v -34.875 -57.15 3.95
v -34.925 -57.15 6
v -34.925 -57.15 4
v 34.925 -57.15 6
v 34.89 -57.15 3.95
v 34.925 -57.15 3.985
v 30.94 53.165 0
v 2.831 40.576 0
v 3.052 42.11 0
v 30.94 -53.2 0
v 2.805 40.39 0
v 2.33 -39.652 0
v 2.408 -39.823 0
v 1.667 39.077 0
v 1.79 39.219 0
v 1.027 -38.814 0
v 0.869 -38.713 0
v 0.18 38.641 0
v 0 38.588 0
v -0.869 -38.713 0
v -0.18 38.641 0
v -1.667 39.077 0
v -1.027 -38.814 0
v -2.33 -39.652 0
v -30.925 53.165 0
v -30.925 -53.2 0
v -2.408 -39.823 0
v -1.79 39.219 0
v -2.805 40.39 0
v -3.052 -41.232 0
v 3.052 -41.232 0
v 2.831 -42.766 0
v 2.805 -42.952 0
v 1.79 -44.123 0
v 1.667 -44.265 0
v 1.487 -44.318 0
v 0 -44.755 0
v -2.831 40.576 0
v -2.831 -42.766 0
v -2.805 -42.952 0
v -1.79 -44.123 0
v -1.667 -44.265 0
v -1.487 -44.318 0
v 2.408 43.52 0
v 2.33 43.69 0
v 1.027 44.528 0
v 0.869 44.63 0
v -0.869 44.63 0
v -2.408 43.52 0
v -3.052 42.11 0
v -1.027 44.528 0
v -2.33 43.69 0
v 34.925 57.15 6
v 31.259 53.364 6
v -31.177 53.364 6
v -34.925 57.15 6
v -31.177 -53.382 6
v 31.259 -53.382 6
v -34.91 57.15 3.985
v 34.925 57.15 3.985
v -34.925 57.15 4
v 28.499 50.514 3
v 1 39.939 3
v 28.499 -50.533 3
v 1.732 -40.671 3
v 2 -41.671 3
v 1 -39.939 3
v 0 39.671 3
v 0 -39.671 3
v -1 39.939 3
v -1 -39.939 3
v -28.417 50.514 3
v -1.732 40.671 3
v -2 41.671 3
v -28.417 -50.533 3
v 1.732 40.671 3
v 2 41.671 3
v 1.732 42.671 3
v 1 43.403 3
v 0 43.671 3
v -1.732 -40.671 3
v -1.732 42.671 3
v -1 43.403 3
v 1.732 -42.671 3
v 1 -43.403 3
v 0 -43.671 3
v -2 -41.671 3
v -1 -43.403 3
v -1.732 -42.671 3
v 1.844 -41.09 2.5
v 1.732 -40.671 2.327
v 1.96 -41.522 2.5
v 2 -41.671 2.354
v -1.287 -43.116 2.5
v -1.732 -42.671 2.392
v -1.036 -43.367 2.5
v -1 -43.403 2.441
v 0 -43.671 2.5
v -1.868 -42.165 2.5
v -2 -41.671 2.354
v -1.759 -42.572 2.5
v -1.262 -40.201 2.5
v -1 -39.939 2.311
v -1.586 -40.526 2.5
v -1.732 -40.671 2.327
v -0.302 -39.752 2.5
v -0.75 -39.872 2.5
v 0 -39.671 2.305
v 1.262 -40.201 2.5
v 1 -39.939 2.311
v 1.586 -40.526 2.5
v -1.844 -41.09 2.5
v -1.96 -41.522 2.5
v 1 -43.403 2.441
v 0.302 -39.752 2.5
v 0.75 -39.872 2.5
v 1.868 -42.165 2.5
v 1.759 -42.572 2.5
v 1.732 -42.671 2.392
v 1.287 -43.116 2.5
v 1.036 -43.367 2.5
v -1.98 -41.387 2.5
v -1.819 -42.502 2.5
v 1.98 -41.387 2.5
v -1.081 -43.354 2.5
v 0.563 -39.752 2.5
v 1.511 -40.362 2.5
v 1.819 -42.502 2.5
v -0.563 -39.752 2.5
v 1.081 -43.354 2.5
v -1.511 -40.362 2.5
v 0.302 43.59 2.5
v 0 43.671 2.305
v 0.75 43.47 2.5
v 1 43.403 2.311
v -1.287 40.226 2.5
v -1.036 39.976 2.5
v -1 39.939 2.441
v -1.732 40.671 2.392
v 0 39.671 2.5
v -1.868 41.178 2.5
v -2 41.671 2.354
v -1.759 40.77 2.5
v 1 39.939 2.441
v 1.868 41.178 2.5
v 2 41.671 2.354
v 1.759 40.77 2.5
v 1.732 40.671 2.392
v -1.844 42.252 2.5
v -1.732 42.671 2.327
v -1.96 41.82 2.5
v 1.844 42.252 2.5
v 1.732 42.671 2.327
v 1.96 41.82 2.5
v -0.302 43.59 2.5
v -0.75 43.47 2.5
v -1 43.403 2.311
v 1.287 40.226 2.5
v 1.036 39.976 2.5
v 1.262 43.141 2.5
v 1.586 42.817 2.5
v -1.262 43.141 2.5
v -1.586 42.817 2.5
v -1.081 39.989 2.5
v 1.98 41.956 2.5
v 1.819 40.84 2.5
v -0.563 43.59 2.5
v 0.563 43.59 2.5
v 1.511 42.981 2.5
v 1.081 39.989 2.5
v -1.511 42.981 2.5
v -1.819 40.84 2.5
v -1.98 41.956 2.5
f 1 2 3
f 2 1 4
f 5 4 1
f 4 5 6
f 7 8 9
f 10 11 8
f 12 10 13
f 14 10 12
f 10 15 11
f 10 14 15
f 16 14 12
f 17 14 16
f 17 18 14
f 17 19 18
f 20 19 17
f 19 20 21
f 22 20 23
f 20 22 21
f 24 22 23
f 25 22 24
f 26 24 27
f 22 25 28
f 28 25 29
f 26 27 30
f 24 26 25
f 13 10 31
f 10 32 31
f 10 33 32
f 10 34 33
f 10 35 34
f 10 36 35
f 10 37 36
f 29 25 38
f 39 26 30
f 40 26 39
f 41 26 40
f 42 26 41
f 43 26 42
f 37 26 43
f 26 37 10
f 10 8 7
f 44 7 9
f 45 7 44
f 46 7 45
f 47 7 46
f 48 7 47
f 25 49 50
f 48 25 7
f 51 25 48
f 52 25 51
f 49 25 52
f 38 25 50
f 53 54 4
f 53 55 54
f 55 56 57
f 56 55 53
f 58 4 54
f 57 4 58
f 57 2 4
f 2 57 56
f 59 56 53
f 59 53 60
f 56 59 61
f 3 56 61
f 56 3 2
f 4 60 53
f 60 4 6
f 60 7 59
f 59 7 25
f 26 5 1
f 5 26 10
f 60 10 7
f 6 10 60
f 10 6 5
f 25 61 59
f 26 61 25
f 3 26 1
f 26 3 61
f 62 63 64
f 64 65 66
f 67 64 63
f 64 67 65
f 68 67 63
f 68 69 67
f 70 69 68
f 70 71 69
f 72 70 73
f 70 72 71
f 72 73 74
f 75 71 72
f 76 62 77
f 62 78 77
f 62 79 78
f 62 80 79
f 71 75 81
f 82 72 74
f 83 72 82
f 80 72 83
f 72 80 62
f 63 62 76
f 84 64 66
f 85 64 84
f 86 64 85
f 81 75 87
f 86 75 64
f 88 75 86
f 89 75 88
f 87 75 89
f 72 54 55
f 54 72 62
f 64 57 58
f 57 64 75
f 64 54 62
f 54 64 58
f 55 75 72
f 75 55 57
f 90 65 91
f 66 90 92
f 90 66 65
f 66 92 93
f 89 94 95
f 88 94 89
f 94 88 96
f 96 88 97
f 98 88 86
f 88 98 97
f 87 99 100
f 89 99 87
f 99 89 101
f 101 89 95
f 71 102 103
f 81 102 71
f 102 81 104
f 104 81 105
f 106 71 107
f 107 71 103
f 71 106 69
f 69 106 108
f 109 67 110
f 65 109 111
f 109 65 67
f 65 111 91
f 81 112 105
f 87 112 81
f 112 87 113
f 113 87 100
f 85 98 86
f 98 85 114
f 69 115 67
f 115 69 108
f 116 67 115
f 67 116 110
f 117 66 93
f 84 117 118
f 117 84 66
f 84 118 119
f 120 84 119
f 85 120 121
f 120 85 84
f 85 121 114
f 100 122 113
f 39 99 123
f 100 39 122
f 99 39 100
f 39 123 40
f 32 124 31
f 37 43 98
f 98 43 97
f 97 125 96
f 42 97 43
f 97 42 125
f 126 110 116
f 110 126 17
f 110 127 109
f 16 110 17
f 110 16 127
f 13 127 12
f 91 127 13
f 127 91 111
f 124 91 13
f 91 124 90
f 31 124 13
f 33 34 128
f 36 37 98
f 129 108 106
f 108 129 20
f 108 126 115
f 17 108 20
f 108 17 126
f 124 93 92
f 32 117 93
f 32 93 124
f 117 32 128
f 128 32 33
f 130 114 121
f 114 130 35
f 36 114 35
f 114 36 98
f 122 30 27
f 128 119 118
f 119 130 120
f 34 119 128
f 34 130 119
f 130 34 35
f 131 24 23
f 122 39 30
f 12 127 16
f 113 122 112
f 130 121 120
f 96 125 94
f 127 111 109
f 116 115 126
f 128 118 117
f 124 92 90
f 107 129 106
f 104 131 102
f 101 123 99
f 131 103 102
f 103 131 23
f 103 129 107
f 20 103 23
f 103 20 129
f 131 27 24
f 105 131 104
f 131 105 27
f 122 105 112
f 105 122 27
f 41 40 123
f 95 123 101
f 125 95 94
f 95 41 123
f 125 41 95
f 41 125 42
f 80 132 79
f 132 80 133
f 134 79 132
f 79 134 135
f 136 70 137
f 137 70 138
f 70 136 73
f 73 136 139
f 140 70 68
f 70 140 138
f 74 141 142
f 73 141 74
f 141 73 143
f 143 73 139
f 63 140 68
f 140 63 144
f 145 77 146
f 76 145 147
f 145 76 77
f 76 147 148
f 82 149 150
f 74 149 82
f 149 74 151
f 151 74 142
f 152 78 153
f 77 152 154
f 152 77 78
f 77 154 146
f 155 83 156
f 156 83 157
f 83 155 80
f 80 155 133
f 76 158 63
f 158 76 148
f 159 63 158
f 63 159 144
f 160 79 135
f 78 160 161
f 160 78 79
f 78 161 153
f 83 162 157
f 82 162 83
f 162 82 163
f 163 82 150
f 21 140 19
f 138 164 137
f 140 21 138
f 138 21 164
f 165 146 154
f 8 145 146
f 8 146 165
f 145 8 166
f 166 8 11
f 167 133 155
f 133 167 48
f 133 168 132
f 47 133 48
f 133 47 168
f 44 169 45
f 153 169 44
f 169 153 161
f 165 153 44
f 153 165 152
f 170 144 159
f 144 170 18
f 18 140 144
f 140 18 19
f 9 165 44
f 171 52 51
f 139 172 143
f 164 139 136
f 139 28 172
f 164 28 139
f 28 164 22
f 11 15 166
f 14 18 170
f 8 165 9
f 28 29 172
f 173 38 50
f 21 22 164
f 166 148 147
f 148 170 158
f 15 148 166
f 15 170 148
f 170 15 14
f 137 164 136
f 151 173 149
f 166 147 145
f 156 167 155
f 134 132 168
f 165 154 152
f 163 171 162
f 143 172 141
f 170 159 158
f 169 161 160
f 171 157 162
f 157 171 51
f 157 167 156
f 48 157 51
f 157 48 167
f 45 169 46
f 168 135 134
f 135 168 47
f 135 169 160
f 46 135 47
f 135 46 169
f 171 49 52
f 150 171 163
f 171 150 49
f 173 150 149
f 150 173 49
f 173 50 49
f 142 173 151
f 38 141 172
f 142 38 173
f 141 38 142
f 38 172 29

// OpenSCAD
// Based on WALLY from thingiverse: https://www.thingiverse.com/thing:47956
// Wall Plate Customizer v1.3
// by TheNewHobbyist 2013 (http://thenewhobbyist.com)
// http://www.thingiverse.com/thing:47956
//
// Most of the connectors used with this thing are panel mount connectors from
// www.DataPro.net I can't vouch for their quality but they did have easy to
// find dimensions for their products so I used them.
//
// This could be tightened up considerably but I thought I'd get it out there for people
// to experiment with before I lose my mind staring at it too long. Also this is my
// first OpenSCAD model so cut me some slack ;)
//
//   Notes:
//
// * The plug types "Duplex Outlet", "Long_Toggle Switch", "Toggle Switch", and "Rocker"
//   will all use the entire plate when selected in top or bottom configuration. The
//   other selection (if not "none" will be selected.
//
// * "None" and "Blank should not be considered equal. if "None" is selected for one of
//   the two holes on a plate the other selection will be centered on that plate. If
//   "Blank" is selected that plug location will remain blank but the other selection
//   will NOT move into a centered position.
//
//	Change Log:
//
//	v1.1
//	UPDATED: Screw hole locations for designer and toggle plate types.
//	UPDATED: Hole size for designer plate type.
//	UPDATED: Outlet hole spacing
//
//	v1.2
//	ADDED: Long Toggle Switch for laird
//
//	v1.3
//	ADDED: 3 new sizes for plate export: Standard, Junior-Jumbo, and Jumbo.
//

  //////////////////////////
 // Customizer Settings: //
//////////////////////////

//How big are we talkin' here?
plate_width = 1; //	[1:5]

// Bigger hole in your wall? Try this
plate_size = 0; // [0:Standard, 1:Junior-Jumbo, 2:Jumbo]

//Pick a plug or full plate type
1st_plate = "none";  //	["none":None, "blank":Blank Port, "toggle":Full Plate - Toggle Switch, "long_toggle":Full Plate - Long Toggle Switch, "outlet":Full Plate - Duplex Outlet, "rocker":Full Plate - Rocker/Designer Plate, "keystone1":Keystone Jack, "vga":VGA Port, "hdmi":HDMI Port, "dvi":DVI-I Port, "displayport":Displayport, "cat5e":Cat5e/Cat6 Port, "usb-a":USB-A Port, "usb-b":USB-B Port, "firewire":Firewire IEEE 1394 Port, "db09":DB-09 Port, "ps2":PS2 Port, "f-type": F-Type/Coaxial Port,"svideo":S-Video Port, "stereo":Stereo Headphone Jack]
//Pick a bottom plug type or leave as none
1st_plate_bottom_hole = "none";  //	["none":None, "blank":Blank Port, "keystone1":Keystone Jack, "vga":VGA Port, "hdmi":HDMI Port, "dvi":DVI-I Port, "displayport":Displayport, "cat5e":Cat5e/Cat6 Port, "usb-a":USB-A Port, "usb-b":USB-B Port, "firewire":Firewire IEEE 1394 Port, "db09":DB-09 Port, "ps2":PS2 Port, "f-type": F-Type/Coaxial Port,"svideo":S-Video Port, "stereo":Stereo Headphone Jack]
//Pick a plug or full plate type
2nd_plate = "none";  //	["none":None, "blank":Blank Port, "toggle":Full Plate - Toggle Switch, "long_toggle":Full Plate - Long Toggle Switch, "outlet":Full Plate - Duplex Outlet, "rocker":Full Plate - Rocker/Designer Plate, "keystone1":Keystone Jack, "vga":VGA Port, "hdmi":HDMI Port, "dvi":DVI-I Port, "displayport":Displayport, "cat5e":Cat5e/Cat6 Port, "usb-a":USB-A Port, "usb-b":USB-B Port, "firewire":Firewire IEEE 1394 Port, "db09":DB-09 Port, "ps2":PS2 Port, "f-type": F-Type/Coaxial Port,"svideo":S-Video Port, "stereo":Stereo Headphone Jack]
//Pick a bottom plug type or leave as none
2nd_plate_bottom_hole = "none";  //	["none":None, "blank":Blank Port, "keystone1":Keystone Jack, "vga":VGA Port, "hdmi":HDMI Port, "dvi":DVI-I Port, "displayport":Displayport, "cat5e":Cat5e/Cat6 Port, "usb-a":USB-A Port, "usb-b":USB-B Port, "firewire":Firewire IEEE 1394 Port, "db09":DB-09 Port, "ps2":PS2 Port, "f-type": F-Type/Coaxial Port,"svideo":S-Video Port, "stereo":Stereo Headphone Jack]
//Pick a plug or full plate type
3rd_plate = "none";  //	["none":None, "blank":Blank Port, "toggle":Full Plate - Toggle Switch, "long_toggle":Full Plate - Long Toggle Switch, "outlet":Full Plate - Duplex Outlet, "rocker":Full Plate - Rocker/Designer Plate, "keystone1":Keystone Jack, "vga":VGA Port, "hdmi":HDMI Port, "dvi":DVI-I Port, "displayport":Displayport, "cat5e":Cat5e/Cat6 Port, "usb-a":USB-A Port, "usb-b":USB-B Port, "firewire":Firewire IEEE 1394 Port, "db09":DB-09 Port, "ps2":PS2 Port, "f-type": F-Type/Coaxial Port,"svideo":S-Video Port, "stereo":Stereo Headphone Jack]
//Pick a bottom plug type or leave as none
3rd_plate_bottom_hole = "none";  //	["none":None, "blank":Blank Port, "keystone1":Keystone Jack, "vga":VGA Port, "hdmi":HDMI Port, "dvi":DVI-I Port, "displayport":Displayport, "cat5e":Cat5e/Cat6 Port, "usb-a":USB-A Port, "usb-b":USB-B Port, "firewire":Firewire IEEE 1394 Port, "db09":DB-09 Port, "ps2":PS2 Port, "f-type": F-Type/Coaxial Port,"svideo":S-Video Port, "stereo":Stereo Headphone Jack]
//Pick a plug or full plate type
4th_plate = "none";  //["none":None, "blank":Blank Port, "toggle":Full Plate - Toggle Switch, "long_toggle":Full Plate - Long Toggle Switch, "outlet":Full Plate - Duplex Outlet, "rocker":Full Plate - Rocker/Designer Plate, "keystone1":Keystone Jack, "vga":VGA Port, "hdmi":HDMI Port, "dvi":DVI-I Port, "displayport":Displayport, "cat5e":Cat5e/Cat6 Port, "usb-a":USB-A Port, "usb-b":USB-B Port, "firewire":Firewire IEEE 1394 Port, "db09":DB-09 Port, "ps2":PS2 Port, "f-type": F-Type/Coaxial Port,"svideo":S-Video Port, "stereo":Stereo Headphone Jack]
//Pick a bottom plug type or leave as none
4th_plate_bottom_hole = "none";  //	["none":None, "blank":Blank Port, "keystone1":Keystone Jack, "vga":VGA Port, "hdmi":HDMI Port, "dvi":DVI-I Port, "displayport":Displayport, "cat5e":Cat5e/Cat6 Port, "usb-a":USB-A Port, "usb-b":USB-B Port, "firewire":Firewire IEEE 1394 Port, "db09":DB-09 Port, "ps2":PS2 Port, "f-type": F-Type/Coaxial Port,"svideo":S-Video Port, "stereo":Stereo Headphone Jack]
//Pick a plug or full plate type
5th_plate = "none";  //["none":None, "blank":Blank Port, "toggle":Full Plate - Toggle Switch, "long_toggle":Full Plate - Long Toggle Switch, "outlet":Full Plate - Duplex Outlet, "rocker":Full Plate - Rocker/Designer Plate, "keystone1":Keystone Jack, "vga":VGA Port, "hdmi":HDMI Port, "dvi":DVI-I Port, "displayport":Displayport, "cat5e":Cat5e/Cat6 Port, "usb-a":USB-A Port, "usb-b":USB-B Port, "firewire":Firewire IEEE 1394 Port, "db09":DB-09 Port, "ps2":PS2 Port, "f-type": F-Type/Coaxial Port,"svideo":S-Video Port, "stereo":Stereo Headphone Jack]
//Pick a bottom plug type or leave as none
5th_plate_bottom_hole = "none";  //	["none":None, "blank":Blank Port, "keystone1":Keystone Jack, "vga":VGA Port, "hdmi":HDMI Port, "dvi":DVI-I Port, "displayport":Displayport, "cat5e":Cat5e/Cat6 Port, "usb-a":USB-A Port, "usb-b":USB-B Port, "firewire":Firewire IEEE 1394 Port, "db09":DB-09 Port, "ps2":PS2 Port, "f-type": F-Type/Coaxial Port,"svideo":S-Video Port, "stereo":Stereo Headphone Jack]

  //////////////////////
 // Static Settings: //
//////////////////////

module GoAwayCustomizer() {
// This module is here to stop Customizer from picking up the variables below
}

l_offset = [34.925,39.6875,44.45];
r_offset = [34.925,39.6875,44.45];
spacer = [0,0,46.0375,92.075,138.1125,184.15];
solid_plate_width = l_offset[plate_size] + spacer[plate_width] + r_offset[plate_size];

height_sizes = [114.3,123.825,133.35];

height = 114.3; //plate height (static)
gang_width=[0,69.86,115.824,161.925,206.375,254]; // Plate widths (standard)

edgewidth = solid_plate_width + 10; // Bevel setting for top and bottom
rightbevel = solid_plate_width - 4; // Bevel for right side (scales)

left_offset = 34.925; // Offset first hole position
switch_offset = 46.0375; // Offset all additional holes
thinner_offset=[0,0.92,0.95,0.96,0.97,0.973]; // Manual fix for right side wackiness

positions=[height_sizes[plate_size]/2,height_sizes[plate_size]/2 - 14.25,height_sizes[plate_size]/2 + 14.25];

// preview[view:north, tilt:bottom]

  ///////////////////
 // Hole Control: //
///////////////////

module plate1(){
	if (1st_plate == "toggle" || 1st_plate_bottom_hole == "toggle"){
		translate([0,l_offset[plate_size],0]) toggle_screws();
		translate([0,l_offset[plate_size],0]) hole("toggle");
		}
	else if (1st_plate == "long_toggle" || 1st_plate_bottom_hole == "long_toggle"){
		translate([0,l_offset[plate_size],0]) toggle_screws();
		translate([0,l_offset[plate_size],0]) hole("long_toggle");
		}
	else if (1st_plate == "rocker" || 1st_plate_bottom_hole == "rocker"){
		translate([0,l_offset[plate_size],0]) rocker_screws();
		translate([0,l_offset[plate_size],0]) hole("rocker");
		}
	else if (1st_plate == "outlet" || 1st_plate_bottom_hole == "outlet") {
	translate([0,l_offset[plate_size],0]) hole("outlet");
	}
	else if (1st_plate_bottom_hole == "none") {
		translate([0,l_offset[plate_size],0]) box_screws();
		translate([positions[0],l_offset[plate_size],0]) hole(1st_plate);
			}
	else if (1st_plate == "none") {
		translate([0,l_offset[plate_size],0]) box_screws();
		translate([positions[0],l_offset[plate_size],0]) hole(1st_plate_bottom_hole);
			}
	else {
	translate([0,l_offset[plate_size],0]) box_screws();
	translate([positions[1],l_offset[plate_size],0]) hole(1st_plate);
	translate([positions[2],l_offset[plate_size],0]) hole(1st_plate_bottom_hole);
	}
}

module plate2(){
	if (2nd_plate == "toggle" || 2nd_plate_bottom_hole == "toggle"){
		translate([0,l_offset[plate_size] + switch_offset,0]) toggle_screws();
		translate([0,l_offset[plate_size] + switch_offset,0]) hole("toggle");
		}
	else if (2nd_plate == "long_toggle" || 2nd_plate_bottom_hole == "long_toggle"){
		translate([0,l_offset[plate_size] + switch_offset,0]) toggle_screws();
		translate([0,l_offset[plate_size] + switch_offset,0]) hole("long_toggle");
		}
	else if (2nd_plate == "rocker" || 2nd_plate_bottom_hole == "rocker"){
		translate([0,l_offset[plate_size] + switch_offset,0]) rocker_screws();
		translate([0,l_offset[plate_size] + switch_offset,0]) hole("rocker");
		}
	else if (2nd_plate == "outlet" || 2nd_plate_bottom_hole == "outlet") {
	translate([0,l_offset[plate_size] + switch_offset,0]) hole("outlet");
	}
	else if (2nd_plate_bottom_hole == "none") {
		translate([0,l_offset[plate_size] + switch_offset,0]) box_screws();
		translate([positions[0],l_offset[plate_size] + switch_offset,0]) hole(2nd_plate);
			}
	else if (2nd_plate == "none") {
		translate([0,l_offset[plate_size] + switch_offset,0]) box_screws();
		translate([positions[0],l_offset[plate_size] + switch_offset,0]) hole(2nd_plate_bottom_hole);
			}
	else {
	translate([0,l_offset[plate_size] + switch_offset,0]) box_screws();
	translate([positions[1],l_offset[plate_size] + switch_offset,0]) hole(2nd_plate);
	translate([positions[2],l_offset[plate_size] + switch_offset,0]) hole(2nd_plate_bottom_hole);
	}
}

module plate3(){
	if (3rd_plate == "toggle" || 3rd_plate_bottom_hole == "toggle"){
		translate([0,l_offset[plate_size] + switch_offset * 2,0]) toggle_screws();
		translate([0,l_offset[plate_size] + switch_offset * 2,0]) hole("toggle");
		}
	else if (3rd_plate == "long_toggle" || 3rd_plate_bottom_hole == "long_toggle"){
		translate([0,l_offset[plate_size] + switch_offset * 2,0]) toggle_screws();
		translate([0,l_offset[plate_size] + switch_offset * 2,0]) hole("long_toggle");
		}
	else if (3rd_plate == "rocker" || 3rd_plate_bottom_hole == "rocker"){
		translate([0,l_offset[plate_size] + switch_offset * 2,0]) rocker_screws();
		translate([0,l_offset[plate_size] + switch_offset * 2,0]) hole("rocker");
		}
	else if (3rd_plate == "outlet" || 3rd_plate_bottom_hole == "outlet") {
	translate([0,l_offset[plate_size] + switch_offset * 2,0]) hole("outlet");
	}
	else if (3rd_plate_bottom_hole == "none") {
		translate([0,l_offset[plate_size] + switch_offset * 2,0]) box_screws();
		translate([positions[0],l_offset[plate_size] + switch_offset * 2,0]) hole(3rd_plate);
			}
	else if (3rd_plate == "none") {
		translate([0,l_offset[plate_size] + switch_offset * 2,0]) box_screws();
		translate([positions[0],l_offset[plate_size] + switch_offset * 2,0]) hole(3rd_plate_bottom_hole);
			}
	else {
	translate([0,l_offset[plate_size] + switch_offset * 2,0]) box_screws();
	translate([positions[1],l_offset[plate_size] + switch_offset * 2,0]) hole(3rd_plate);
	translate([positions[2],l_offset[plate_size] + switch_offset * 2,0]) hole(3rd_plate_bottom_hole);
	}
}

module plate4(){
	if (4th_plate == "toggle" || 4th_plate_bottom_hole == "toggle"){
		translate([0,l_offset[plate_size] + switch_offset * 3,0]) toggle_screws();
		translate([0,l_offset[plate_size] + switch_offset * 3,0]) hole("toggle");
		}
	else if (4th_plate == "long_toggle" || 4th_plate_bottom_hole == "long_toggle"){
		translate([0,l_offset[plate_size] + switch_offset * 3,0]) toggle_screws();
		translate([0,l_offset[plate_size] + switch_offset * 3,0]) hole("long_toggle");
		}
	else if (4th_plate == "rocker" || 4th_plate_bottom_hole == "rocker"){
		translate([0,l_offset[plate_size] + switch_offset * 3,0]) rocker_screws();
		translate([0,l_offset[plate_size] + switch_offset * 3,0]) hole("rocker");
		}
	else if (4th_plate == "outlet" || 4th_plate_bottom_hole == "outlet") {
	translate([0,l_offset[plate_size] + switch_offset * 3,0]) hole("outlet");
	}
	else if (4th_plate_bottom_hole == "none") {
		translate([0,l_offset[plate_size] + switch_offset * 3,0]) box_screws();
		translate([positions[0],l_offset[plate_size] + switch_offset * 3,0]) hole(4th_plate);
			}
	else if (4th_plate == "none") {
		translate([0,l_offset[plate_size] + switch_offset * 3,0]) box_screws();
		translate([positions[0],l_offset[plate_size] + switch_offset * 3,0]) hole(4th_plate_bottom_hole);
			}
	else {
	translate([0,l_offset[plate_size] + switch_offset * 3,0]) box_screws();
	translate([positions[1],l_offset[plate_size] + switch_offset * 3,0]) hole(4th_plate);
	translate([positions[2],l_offset[plate_size] + switch_offset * 3,0]) hole(4th_plate_bottom_hole);
	}
}

module plate5(){
	if (5th_plate == "toggle" || 5th_plate_bottom_hole == "toggle"){
		translate([0,l_offset[plate_size] + switch_offset * 4,0]) toggle_screws();
		translate([0,l_offset[plate_size] + switch_offset * 4,0]) hole("toggle");
		}
	else if (5th_plate == "long_toggle" || 5th_plate_bottom_hole == "long_toggle"){
		translate([0,l_offset[plate_size] + switch_offset * 4,0]) toggle_screws();
		translate([0,l_offset[plate_size] + switch_offset * 4,0]) hole("long_toggle");
		}
	else if (5th_plate == "rocker" || 5th_plate_bottom_hole == "rocker"){
		translate([0,l_offset[plate_size] + switch_offset * 4,0]) rocker_screws();
		translate([0,l_offset[plate_size] + switch_offset * 4,0]) hole("rocker");
		}
	else if (5th_plate == "outlet" || 5th_plate_bottom_hole == "outlet") {
	translate([0,l_offset[plate_size] + switch_offset * 4,0]) hole("outlet");
	}
	else if (5th_plate_bottom_hole == "none") {
		translate([0,l_offset[plate_size] + switch_offset * 4,0]) box_screws();
		translate([positions[0],l_offset[plate_size] + switch_offset * 4,0]) hole(5th_plate);
			}
	else if (5th_plate == "none") {
		translate([0,l_offset[plate_size] + switch_offset * 4,0]) box_screws();
		translate([positions[0],l_offset[plate_size] + switch_offset * 4,0]) hole(5th_plate_bottom_hole);
			}
	else {
	translate([0,l_offset[plate_size] + switch_offset * 4,0]) box_screws();
	translate([positions[1],l_offset[plate_size] + switch_offset * 4,0]) hole(5th_plate);
	translate([positions[2],l_offset[plate_size] + switch_offset * 4,0]) hole(5th_plate_bottom_hole);
	}
}

  /////////////////
 // SolidWorks: //
/////////////////

module plate1_solid(){
if (1st_plate == "keystone1" && 1st_plate_bottom_hole == "none") {
	translate([height_sizes[plate_size]/2 + 14.3,l_offset[plate_size] - 11.5,-3.9]) hole("keystone_solid");
	}
else if (1st_plate == "keystone1" && 1st_plate_bottom_hole != "outlet" && 1st_plate_bottom_hole != "toggle" && 1st_plate_bottom_hole != "rocker") {
	translate([height_sizes[plate_size]/2,l_offset[plate_size] - 11.5,-3.9]) hole("keystone_solid");
	}
if (1st_plate_bottom_hole == "keystone1" && 1st_plate == "none") {
	translate([height_sizes[plate_size]/2 + 14.3,l_offset[plate_size] - 11.5,-3.9]) hole("keystone_solid");
	}
else if (1st_plate_bottom_hole == "keystone1" && 1st_plate != "outlet" && 1st_plate != "toggle" && 1st_plate != "rocker") {
	translate([height_sizes[plate_size]/2 + 28.5,l_offset[plate_size] - 11.5,-3.9]) hole("keystone_solid");
	}

}

module plate2_solid(){
if (2nd_plate == "keystone1" && 2nd_plate_bottom_hole == "none") {
	translate([height_sizes[plate_size]/2 + 14.3,l_offset[plate_size] - 11.5 + switch_offset,-3.9]) hole("keystone_solid");
	}
else if (2nd_plate == "keystone1" && 2nd_plate_bottom_hole != "outlet" && 2nd_plate_bottom_hole != "toggle" && 2nd_plate_bottom_hole != "rocker") {
	translate([height_sizes[plate_size]/2,l_offset[plate_size] - 11.5 + switch_offset,-3.9]) hole("keystone_solid");
	}
if (2nd_plate_bottom_hole == "keystone1" && 2nd_plate == "none") {
	translate([height_sizes[plate_size]/2 + 14.3,l_offset[plate_size] - 11.5 + switch_offset,-3.9]) hole("keystone_solid");
	}
else if (2nd_plate_bottom_hole == "keystone1" && 2nd_plate != "outlet" && 2nd_plate != "toggle" && 2nd_plate != "rocker") {
	translate([height_sizes[plate_size]/2 + 28.5,l_offset[plate_size] - 11.5 + switch_offset,-3.9]) hole("keystone_solid");
	}

}

module plate3_solid(){
if (3rd_plate == "keystone1" && 3rd_plate_bottom_hole == "none") {
	translate([height_sizes[plate_size]/2 + 14.3,l_offset[plate_size] - 11.5 + switch_offset * 2,-3.9]) hole("keystone_solid");
	}
else if (3rd_plate == "keystone1" && 3rd_plate_bottom_hole != "outlet" && 3rd_plate_bottom_hole != "toggle" && 3rd_plate_bottom_hole != "rocker") {
	translate([height_sizes[plate_size]/2,l_offset[plate_size] - 11.5 + switch_offset * 2,-3.9]) hole("keystone_solid");
	}
if (3rd_plate_bottom_hole == "keystone1" && 3rd_plate == "none") {
	translate([height_sizes[plate_size]/2 + 14.3,l_offset[plate_size] - 11.5 + switch_offset * 2,-3.9]) hole("keystone_solid");
	}
else if (3rd_plate_bottom_hole == "keystone1" && 3rd_plate != "outlet" && 3rd_plate != "toggle" && 3rd_plate != "rocker") {
	translate([height_sizes[plate_size]/2 + 28.5,l_offset[plate_size] - 11.5 + switch_offset * 2,-3.9]) hole("keystone_solid");
	}

}

module plate4_solid(){
if (4th_plate == "keystone1" && 4th_plate_bottom_hole == "none") {
	translate([height_sizes[plate_size]/2 + 14.3,l_offset[plate_size] - 11.5 + switch_offset * 3,-3.9]) hole("keystone_solid");
	}
else if (4th_plate == "keystone1" && 4th_plate_bottom_hole != "outlet" && 4th_plate_bottom_hole != "toggle" && 4th_plate_bottom_hole != "rocker") {
	translate([height_sizes[plate_size]/2,l_offset[plate_size] - 11.5 + switch_offset * 3,-3.9]) hole("keystone_solid");
	}
if (4th_plate_bottom_hole == "keystone1" && 4th_plate == "none") {
	translate([height_sizes[plate_size]/2 + 14.3,l_offset[plate_size] - 11.5 + switch_offset * 3,-3.9]) hole("keystone_solid");
	}
else if (4th_plate_bottom_hole == "keystone1" && 4th_plate != "outlet" && 4th_plate != "toggle" && 4th_plate != "rocker") {
	translate([height_sizes[plate_size]/2 + 28.5,l_offset[plate_size] - 11.5 + switch_offset * 3,-3.9]) hole("keystone_solid");
	}

}

module plate5_solid(){
if (5th_plate == "keystone1" && 5th_plate_bottom_hole == "none") {
	translate([height_sizes[plate_size]/2 + 14.3,l_offset[plate_size] - 11.5 + switch_offset * 4,-3.9]) hole("keystone_solid");
	}
else if (5th_plate == "keystone1" && 5th_plate_bottom_hole != "outlet" && 5th_plate_bottom_hole != "toggle" && 5th_plate_bottom_hole != "rocker") {
	translate([height_sizes[plate_size]/2,l_offset[plate_size] - 11.5 + switch_offset * 4,-3.9]) hole("keystone_solid");
	}
if (5th_plate_bottom_hole == "keystone1" && 5th_plate == "none") {
	translate([height_sizes[plate_size]/2 + 14.3,l_offset[plate_size] - 11.5 + switch_offset * 4,-3.9]) hole("keystone_solid");
	}
else if (5th_plate_bottom_hole == "keystone1" && 5th_plate != "outlet" && 5th_plate != "toggle" && 5th_plate != "rocker") {
	translate([height_sizes[plate_size]/2 + 28.5,l_offset[plate_size] - 11.5 + switch_offset * 4,-3.9]) hole("keystone_solid");
	}

}

  ///////////////////
 // PlateStation: //
///////////////////

//Plate size and bevel
module plate() {
	difference() {
		cube([height_sizes[plate_size],solid_plate_width,6]);
		translate([-4.3,-5,6.2]) rotate([0,45,0]) cube([6,edgewidth,6]); //Top Bevel
		translate([height_sizes[plate_size]-4.2,-5,6.25]) rotate([0,45,0]) cube([6,edgewidth,6]); //Bottom Bevel
		translate([height_sizes[plate_size]+10,-4.4,6.1]) rotate([0,45,90]) cube([6,height_sizes[plate_size]+20,6]); //Left Bevel (doesn't change)
		translate([height_sizes[plate_size]+10,rightbevel,6]) rotate([0,45,90]) cube([6,height_sizes[plate_size]+10,6]); //Right Bevel (scales right)
				}
			}


// Thinning Plate
module plate_inner() {
	scale([0.95,thinner_offset[plate_width],1]){
	translate([3,3,0]){
	difference() {
		cube([height_sizes[plate_size],solid_plate_width,6]);
		translate([-4.3,-5,6.2]) rotate([0,45,0]) cube([6,edgewidth,6]); //Top Bevel
		translate([height_sizes[plate_size]-4.2,-5,6.25]) rotate([0,45,0]) cube([6,edgewidth,6]); //Bottom Bevel
		translate([height_sizes[plate_size]+10,-4.4,6.1]) rotate([0,45,90]) cube([6,height_sizes[plate_size]+20,6]); //Left Bevel (doesn't change)
		translate([height_sizes[plate_size]+10,rightbevel,6]) rotate([0,45,90]) cube([6,height_sizes[plate_size]+10,6]); //Right Bevel (scales right)
				}
			}
		}
	}

// Box screw holes
module box_screws(){
	 translate([height_sizes[plate_size]/2 + 41.67125,0,-1]) cylinder(r=2, h=10, $fn=12);
	 translate([height_sizes[plate_size]/2 + 41.67125,0,3.5]) cylinder(r1=2, r2=3.3, h=3);
	 translate([height_sizes[plate_size]/2 - 41.67125,0,-1]) cylinder(r=2, h=10, $fn=12);
	 translate([height_sizes[plate_size]/2 - 41.67125,0,3.5]) cylinder(r1=2, r2=3.3, h=3);
}

// Rocker/Designer screw holes
module rocker_screws(){
	 translate([height_sizes[plate_size]/2 + 48.41875,0,-1]) cylinder(r=2, h=10, $fn=12);
	 translate([height_sizes[plate_size]/2 + 48.41875,0,3.5]) cylinder(r1=2, r2=3.3, h=3);
	 translate([height_sizes[plate_size]/2 - 48.41875,0,-1]) cylinder(r=2, h=10, $fn=12);
	 translate([height_sizes[plate_size]/2 - 48.41875,0,3.5]) cylinder(r1=2, r2=3.3, h=3);
}

// Toggle screw holes
module toggle_screws(){
	 translate([height_sizes[plate_size]/2 + 30.1625,0,-1]) cylinder(r=2, h=10, $fn=12);
	 translate([height_sizes[plate_size]/2 + 30.1625,0,3.5]) cylinder(r1=2, r2=3.3, h=3);
	 translate([height_sizes[plate_size]/2 - 30.1625,0,-1]) cylinder(r=2, h=10, $fn=12);
	 translate([height_sizes[plate_size]/2 - 30.1625,0,3.5]) cylinder(r1=2, r2=3.3, h=3);
}

  ///////////////
 // Portland: //
///////////////

// Hole Cutout definitions
module hole(hole_type) {


// Toggle switch hole
	if (hole_type == "toggle") {
		translate([height_sizes[plate_size]/2,0,0]) cube([23.8125,10.3188,15], center = true);
		 						}

// Toggle switch hole and screw holes
	if (hole_type == "long_toggle") {
		translate([height_sizes[plate_size]/2,0,0]) cube([43.6563,11.9063,15], center = true);
		 						}

// Rocker switch plate
	if (hole_type == "rocker") {
		translate([height_sizes[plate_size]/2,0,0]) cube([67.1,33.3,15], center = true);

		 						}

// Duplex power outlet plate or dual side toggles
	if (hole_type == "outlet" || hole_type == "dualsidetoggle") {
		translate([height_sizes[plate_size]/2 + 19.3915,0,0]) {
			difference() {
				cylinder(r=17.4625, h=15, center = true);
				translate([-24.2875,-15,-2]) cube([10,37,15], center = false);
				translate([14.2875,-15,-2]) cube([10,37,15], center = false);
								}
							}
		translate([height_sizes[plate_size]/2 - 19.3915,0,0]){
			difference(){
				cylinder(r=17.4625, h=15, center = true);
				translate([-24.2875,-15,-2]) cube([10,37,15], center = false);
				translate([14.2875,-15,-2]) cube([10,37,15], center = false);
								}
							}
		translate([height_sizes[plate_size]/2,0,-1]) cylinder(r=2, h=10);
		translate([height_sizes[plate_size]/2,0,3.5]) cylinder(r1=2, r2=3.3, h=3);
							}

// Blank plate
	if (hole_type == "blank") { }

// VGA & DB09 plate
// VGA Fits http://www.datapro.net/products/vga-dual-panel-mount-f-f-cable.html
// DB09 Fits http://www.datapro.net/products/db9-serial-panel-mount-male-extension.html
	if (hole_type == "vga" || hole_type == "db09") {

			translate([0,-12.5,3]) cylinder(r=1.75, h=10, center = true);
			translate([0,12.5,3]) cylinder(r=1.75, h=10, center = true);
				difference(){
					cube([10,19,13], center=true);
					translate([-5,-9.2,1]) rotate([0,0,-35.6]) cube([4.4,2.4,15], center=true);
					translate([.9,-11.2,0]) rotate([0,0,9.6]) cube([10,4.8,15], center=true);
					translate([4.6,-8.5,0]) rotate([0,0,37.2]) cube([4.4,2.4,15], center=true);
					translate([-5,9.2,1]) rotate([0,0,35.6]) cube([4.4,2.4,15], center=true);
					translate([0.9,11.2,0]) rotate([0,0,-9.6]) cube([10,4.8,15], center=true);
					translate([4.6,8.5,0]) rotate([0,0,-37.2]) cube([4.4,2.4,15], center=true);
								}
						}

// HDMI plate
// Fits http://www.datapro.net/products/hdmi-panel-mount-extension-cable.html
	if (hole_type == "hdmi") {
		translate([0,-13,3]) cylinder(r=1.75, h=10, center = true);
		translate([0,13,3]) cylinder(r=1.75, h=10, center = true);
		translate([0,0,3]) cube([6,16,10], center=true);
							}

// DVI-I plate
// Fits http://www.datapro.net/products/dvi-i-panel-mount-extension-cable.html
	if (hole_type == "dvi") {
		translate([0,-16,3]) cylinder(r=1.75, h=10, center = true);
		translate([0,16,3]) cylinder(r=1.75, h=10, center = true);
		translate([0,0,3]) cube([10,26,10], center=true);
							}

// DisplayPort plate
// Fits http://www.datapro.net/products/dvi-i-panel-mount-extension-cable.html
	if (hole_type == "displayport") {
		translate([0,-13.5,3]) cylinder(r=1.75, h=10, center = true);
		translate([0,13.5,3]) cylinder(r=1.75, h=10, center = true);
		translate([0,0,0]){
			difference(){
				translate([0,0,3]) cube([7,19,10], center=true);
				translate([2.47,-9.37,3]) rotate([0,0,-54.6]) cube([3,5,14], center=true);
						}
								}
									}

// USB-A Plate
// Fits http://www.datapro.net/products/usb-panel-mount-type-a-cable.html
	if (hole_type == "usb-a") {
		translate([0,-15,3]) cylinder(r=1.75, h=10, center = true);
		translate([0,15,3]) cylinder(r=1.75, h=10, center = true);
		translate([0,0,3]) cube([8,16,10], center=true);
							}

// USB-B Plate
// Fits http://www.datapro.net/products/usb-panel-mount-type-b-cable.html
	if (hole_type == "usb-b") {
		translate([0,-13,3]) cylinder(r=1.75, h=10, center = true);
		translate([0,13,3]) cylinder(r=1.75, h=10, center = true);
		translate([0,0,3]) cube([11,12,10], center=true);
							}

// 1394 Firewire Plate
// Fits http://www.datapro.net/products/firewire-panel-mount-extension.html
	if (hole_type == "firewire") {
		translate([0,-13.5,3]) cylinder(r=1.75, h=10, center = true);
		translate([0,13.5,3]) cylinder(r=1.75, h=10, center = true);
		translate([0,0,3]) cube([7,12,10], center=true);
							}

// F-Type / Cable TV Plate
// Fits http://www.datapro.net/products/f-type-panel-mounting-coupler.html
	if (hole_type == "f-type") {
		translate([0,0,3]) cylinder(r=4.7625, h=10, center=true);
							}

// Cat5e & Gat6 plate
// Cat5e Fits http://www.datapro.net/products/cat-5e-panel-mount-ethernet.html
// Cat6 Fits hhttp://www.datapro.net/products/cat-6-panel-mount-ethernet.html
	if (hole_type == "cat5e" || hole_type == "cat6") {
		translate([0,-12.5,3]) cylinder(r=1.75, h=10, center = true);
		translate([0,12.5,3]) cylinder(r=1.75, h=10, center = true);
		translate([0,0,3]) cube([15,15,10], center=true);
		}

// S-Video & PS2 plate
// S-Video Fits hhttp://www.datapro.net/products/cat-6-panel-mount-ethernet.html
// PS2 http://www.datapro.net/products/ps2-panel-mount-extension-cable.html
	if (hole_type == "svideo" || hole_type == "ps2") {
		translate([0,-10,3]) cylinder(r=1.75, h=10, center = true);
		translate([0,10,3]) cylinder(r=1.75, h=10, center = true);
		translate([0,0,3]) cylinder(r=5, h=10, center=true);
		}


// Stereo / 1/4" headphone jack coupler
// Stereo coupler Fits http://www.datapro.net/products/stereo-panel-mount-coupler.html
	if (hole_type == "stereo") {
		translate([0,0,3]) cylinder(r=2.985, h=10, center=true);
		}

//Keystone1 hole
//Hole for 1 Keystone Jack
	if (hole_type == "keystone1") {
		translate([0,0,5]) cube([16.5,15,10], center = true);
	}

//Keystone Solid
	if (hole_type == "keystone_solid") {
		rotate([0,0,90]) {
			difference(){
				translate([0,0,.1]) cube([23,30.5,9.8]);
					translate([4,4,0]){
						difference(){
							cube([15,22.5,10]);
							translate([-1,-0.001,3.501]) cube([17,2,6.5]);
							translate([-1,2.5,-3.40970]) rotate([45,0,0]) cube([17,2,6.5]);
							translate([-1,18.501,6.001]) cube([17,4,4]);
							translate([-1,20.5,0]) rotate([-45,0,0]) cube([17,2,6.5]);
						}
					}
				}
			}
		}

//End of module "hole"
}

  ////////////////////////
 // Number One ENGAGE: //
////////////////////////

// Rotate so it sits correctly on plate (whoops) and make upside down
rotate([0,180,90]){
// put plate at 0,0,0 for easier printing
translate([-height_sizes[plate_size]/2,-solid_plate_width/2,-6]){

if (plate_width == 1) {
	difference() {
		plate();
		translate([0,0,-3]) plate_inner();
		plate1();
			}
		union() {
		plate1_solid();
		}
			}

else if (plate_width == 2) {
difference()
{
plate();
translate([0,0,-3]) plate_inner();
plate1();
plate2();
}
union() {
		plate1_solid();
		plate2_solid();
		}
}

else if (plate_width == 3) {
difference()
{
plate();
translate([0,0,-3]) plate_inner();
plate1();
plate2();
plate3();
}
union() {
		plate1_solid();
		plate2_solid();
		plate3_solid();
		}
}

else if (plate_width == 4) {
difference()
{
plate();
translate([0,0,-3]) plate_inner();
plate1();
plate2();
plate3();
plate4();
}
union() {
		plate1_solid();
		plate2_solid();
		plate3_solid();
		plate4_solid();
		}
}

else if (plate_width == 5) {
difference()
{
plate();
translate([0,0,-3]) plate_inner();
plate1();
plate2();
plate3();
plate4();
plate5();
}
union() {
		plate1_solid();
		plate2_solid();
		plate3_solid();
		plate4_solid();
		plate5_solid();
		}
}

//End Rotate
}
//End Translate
}
